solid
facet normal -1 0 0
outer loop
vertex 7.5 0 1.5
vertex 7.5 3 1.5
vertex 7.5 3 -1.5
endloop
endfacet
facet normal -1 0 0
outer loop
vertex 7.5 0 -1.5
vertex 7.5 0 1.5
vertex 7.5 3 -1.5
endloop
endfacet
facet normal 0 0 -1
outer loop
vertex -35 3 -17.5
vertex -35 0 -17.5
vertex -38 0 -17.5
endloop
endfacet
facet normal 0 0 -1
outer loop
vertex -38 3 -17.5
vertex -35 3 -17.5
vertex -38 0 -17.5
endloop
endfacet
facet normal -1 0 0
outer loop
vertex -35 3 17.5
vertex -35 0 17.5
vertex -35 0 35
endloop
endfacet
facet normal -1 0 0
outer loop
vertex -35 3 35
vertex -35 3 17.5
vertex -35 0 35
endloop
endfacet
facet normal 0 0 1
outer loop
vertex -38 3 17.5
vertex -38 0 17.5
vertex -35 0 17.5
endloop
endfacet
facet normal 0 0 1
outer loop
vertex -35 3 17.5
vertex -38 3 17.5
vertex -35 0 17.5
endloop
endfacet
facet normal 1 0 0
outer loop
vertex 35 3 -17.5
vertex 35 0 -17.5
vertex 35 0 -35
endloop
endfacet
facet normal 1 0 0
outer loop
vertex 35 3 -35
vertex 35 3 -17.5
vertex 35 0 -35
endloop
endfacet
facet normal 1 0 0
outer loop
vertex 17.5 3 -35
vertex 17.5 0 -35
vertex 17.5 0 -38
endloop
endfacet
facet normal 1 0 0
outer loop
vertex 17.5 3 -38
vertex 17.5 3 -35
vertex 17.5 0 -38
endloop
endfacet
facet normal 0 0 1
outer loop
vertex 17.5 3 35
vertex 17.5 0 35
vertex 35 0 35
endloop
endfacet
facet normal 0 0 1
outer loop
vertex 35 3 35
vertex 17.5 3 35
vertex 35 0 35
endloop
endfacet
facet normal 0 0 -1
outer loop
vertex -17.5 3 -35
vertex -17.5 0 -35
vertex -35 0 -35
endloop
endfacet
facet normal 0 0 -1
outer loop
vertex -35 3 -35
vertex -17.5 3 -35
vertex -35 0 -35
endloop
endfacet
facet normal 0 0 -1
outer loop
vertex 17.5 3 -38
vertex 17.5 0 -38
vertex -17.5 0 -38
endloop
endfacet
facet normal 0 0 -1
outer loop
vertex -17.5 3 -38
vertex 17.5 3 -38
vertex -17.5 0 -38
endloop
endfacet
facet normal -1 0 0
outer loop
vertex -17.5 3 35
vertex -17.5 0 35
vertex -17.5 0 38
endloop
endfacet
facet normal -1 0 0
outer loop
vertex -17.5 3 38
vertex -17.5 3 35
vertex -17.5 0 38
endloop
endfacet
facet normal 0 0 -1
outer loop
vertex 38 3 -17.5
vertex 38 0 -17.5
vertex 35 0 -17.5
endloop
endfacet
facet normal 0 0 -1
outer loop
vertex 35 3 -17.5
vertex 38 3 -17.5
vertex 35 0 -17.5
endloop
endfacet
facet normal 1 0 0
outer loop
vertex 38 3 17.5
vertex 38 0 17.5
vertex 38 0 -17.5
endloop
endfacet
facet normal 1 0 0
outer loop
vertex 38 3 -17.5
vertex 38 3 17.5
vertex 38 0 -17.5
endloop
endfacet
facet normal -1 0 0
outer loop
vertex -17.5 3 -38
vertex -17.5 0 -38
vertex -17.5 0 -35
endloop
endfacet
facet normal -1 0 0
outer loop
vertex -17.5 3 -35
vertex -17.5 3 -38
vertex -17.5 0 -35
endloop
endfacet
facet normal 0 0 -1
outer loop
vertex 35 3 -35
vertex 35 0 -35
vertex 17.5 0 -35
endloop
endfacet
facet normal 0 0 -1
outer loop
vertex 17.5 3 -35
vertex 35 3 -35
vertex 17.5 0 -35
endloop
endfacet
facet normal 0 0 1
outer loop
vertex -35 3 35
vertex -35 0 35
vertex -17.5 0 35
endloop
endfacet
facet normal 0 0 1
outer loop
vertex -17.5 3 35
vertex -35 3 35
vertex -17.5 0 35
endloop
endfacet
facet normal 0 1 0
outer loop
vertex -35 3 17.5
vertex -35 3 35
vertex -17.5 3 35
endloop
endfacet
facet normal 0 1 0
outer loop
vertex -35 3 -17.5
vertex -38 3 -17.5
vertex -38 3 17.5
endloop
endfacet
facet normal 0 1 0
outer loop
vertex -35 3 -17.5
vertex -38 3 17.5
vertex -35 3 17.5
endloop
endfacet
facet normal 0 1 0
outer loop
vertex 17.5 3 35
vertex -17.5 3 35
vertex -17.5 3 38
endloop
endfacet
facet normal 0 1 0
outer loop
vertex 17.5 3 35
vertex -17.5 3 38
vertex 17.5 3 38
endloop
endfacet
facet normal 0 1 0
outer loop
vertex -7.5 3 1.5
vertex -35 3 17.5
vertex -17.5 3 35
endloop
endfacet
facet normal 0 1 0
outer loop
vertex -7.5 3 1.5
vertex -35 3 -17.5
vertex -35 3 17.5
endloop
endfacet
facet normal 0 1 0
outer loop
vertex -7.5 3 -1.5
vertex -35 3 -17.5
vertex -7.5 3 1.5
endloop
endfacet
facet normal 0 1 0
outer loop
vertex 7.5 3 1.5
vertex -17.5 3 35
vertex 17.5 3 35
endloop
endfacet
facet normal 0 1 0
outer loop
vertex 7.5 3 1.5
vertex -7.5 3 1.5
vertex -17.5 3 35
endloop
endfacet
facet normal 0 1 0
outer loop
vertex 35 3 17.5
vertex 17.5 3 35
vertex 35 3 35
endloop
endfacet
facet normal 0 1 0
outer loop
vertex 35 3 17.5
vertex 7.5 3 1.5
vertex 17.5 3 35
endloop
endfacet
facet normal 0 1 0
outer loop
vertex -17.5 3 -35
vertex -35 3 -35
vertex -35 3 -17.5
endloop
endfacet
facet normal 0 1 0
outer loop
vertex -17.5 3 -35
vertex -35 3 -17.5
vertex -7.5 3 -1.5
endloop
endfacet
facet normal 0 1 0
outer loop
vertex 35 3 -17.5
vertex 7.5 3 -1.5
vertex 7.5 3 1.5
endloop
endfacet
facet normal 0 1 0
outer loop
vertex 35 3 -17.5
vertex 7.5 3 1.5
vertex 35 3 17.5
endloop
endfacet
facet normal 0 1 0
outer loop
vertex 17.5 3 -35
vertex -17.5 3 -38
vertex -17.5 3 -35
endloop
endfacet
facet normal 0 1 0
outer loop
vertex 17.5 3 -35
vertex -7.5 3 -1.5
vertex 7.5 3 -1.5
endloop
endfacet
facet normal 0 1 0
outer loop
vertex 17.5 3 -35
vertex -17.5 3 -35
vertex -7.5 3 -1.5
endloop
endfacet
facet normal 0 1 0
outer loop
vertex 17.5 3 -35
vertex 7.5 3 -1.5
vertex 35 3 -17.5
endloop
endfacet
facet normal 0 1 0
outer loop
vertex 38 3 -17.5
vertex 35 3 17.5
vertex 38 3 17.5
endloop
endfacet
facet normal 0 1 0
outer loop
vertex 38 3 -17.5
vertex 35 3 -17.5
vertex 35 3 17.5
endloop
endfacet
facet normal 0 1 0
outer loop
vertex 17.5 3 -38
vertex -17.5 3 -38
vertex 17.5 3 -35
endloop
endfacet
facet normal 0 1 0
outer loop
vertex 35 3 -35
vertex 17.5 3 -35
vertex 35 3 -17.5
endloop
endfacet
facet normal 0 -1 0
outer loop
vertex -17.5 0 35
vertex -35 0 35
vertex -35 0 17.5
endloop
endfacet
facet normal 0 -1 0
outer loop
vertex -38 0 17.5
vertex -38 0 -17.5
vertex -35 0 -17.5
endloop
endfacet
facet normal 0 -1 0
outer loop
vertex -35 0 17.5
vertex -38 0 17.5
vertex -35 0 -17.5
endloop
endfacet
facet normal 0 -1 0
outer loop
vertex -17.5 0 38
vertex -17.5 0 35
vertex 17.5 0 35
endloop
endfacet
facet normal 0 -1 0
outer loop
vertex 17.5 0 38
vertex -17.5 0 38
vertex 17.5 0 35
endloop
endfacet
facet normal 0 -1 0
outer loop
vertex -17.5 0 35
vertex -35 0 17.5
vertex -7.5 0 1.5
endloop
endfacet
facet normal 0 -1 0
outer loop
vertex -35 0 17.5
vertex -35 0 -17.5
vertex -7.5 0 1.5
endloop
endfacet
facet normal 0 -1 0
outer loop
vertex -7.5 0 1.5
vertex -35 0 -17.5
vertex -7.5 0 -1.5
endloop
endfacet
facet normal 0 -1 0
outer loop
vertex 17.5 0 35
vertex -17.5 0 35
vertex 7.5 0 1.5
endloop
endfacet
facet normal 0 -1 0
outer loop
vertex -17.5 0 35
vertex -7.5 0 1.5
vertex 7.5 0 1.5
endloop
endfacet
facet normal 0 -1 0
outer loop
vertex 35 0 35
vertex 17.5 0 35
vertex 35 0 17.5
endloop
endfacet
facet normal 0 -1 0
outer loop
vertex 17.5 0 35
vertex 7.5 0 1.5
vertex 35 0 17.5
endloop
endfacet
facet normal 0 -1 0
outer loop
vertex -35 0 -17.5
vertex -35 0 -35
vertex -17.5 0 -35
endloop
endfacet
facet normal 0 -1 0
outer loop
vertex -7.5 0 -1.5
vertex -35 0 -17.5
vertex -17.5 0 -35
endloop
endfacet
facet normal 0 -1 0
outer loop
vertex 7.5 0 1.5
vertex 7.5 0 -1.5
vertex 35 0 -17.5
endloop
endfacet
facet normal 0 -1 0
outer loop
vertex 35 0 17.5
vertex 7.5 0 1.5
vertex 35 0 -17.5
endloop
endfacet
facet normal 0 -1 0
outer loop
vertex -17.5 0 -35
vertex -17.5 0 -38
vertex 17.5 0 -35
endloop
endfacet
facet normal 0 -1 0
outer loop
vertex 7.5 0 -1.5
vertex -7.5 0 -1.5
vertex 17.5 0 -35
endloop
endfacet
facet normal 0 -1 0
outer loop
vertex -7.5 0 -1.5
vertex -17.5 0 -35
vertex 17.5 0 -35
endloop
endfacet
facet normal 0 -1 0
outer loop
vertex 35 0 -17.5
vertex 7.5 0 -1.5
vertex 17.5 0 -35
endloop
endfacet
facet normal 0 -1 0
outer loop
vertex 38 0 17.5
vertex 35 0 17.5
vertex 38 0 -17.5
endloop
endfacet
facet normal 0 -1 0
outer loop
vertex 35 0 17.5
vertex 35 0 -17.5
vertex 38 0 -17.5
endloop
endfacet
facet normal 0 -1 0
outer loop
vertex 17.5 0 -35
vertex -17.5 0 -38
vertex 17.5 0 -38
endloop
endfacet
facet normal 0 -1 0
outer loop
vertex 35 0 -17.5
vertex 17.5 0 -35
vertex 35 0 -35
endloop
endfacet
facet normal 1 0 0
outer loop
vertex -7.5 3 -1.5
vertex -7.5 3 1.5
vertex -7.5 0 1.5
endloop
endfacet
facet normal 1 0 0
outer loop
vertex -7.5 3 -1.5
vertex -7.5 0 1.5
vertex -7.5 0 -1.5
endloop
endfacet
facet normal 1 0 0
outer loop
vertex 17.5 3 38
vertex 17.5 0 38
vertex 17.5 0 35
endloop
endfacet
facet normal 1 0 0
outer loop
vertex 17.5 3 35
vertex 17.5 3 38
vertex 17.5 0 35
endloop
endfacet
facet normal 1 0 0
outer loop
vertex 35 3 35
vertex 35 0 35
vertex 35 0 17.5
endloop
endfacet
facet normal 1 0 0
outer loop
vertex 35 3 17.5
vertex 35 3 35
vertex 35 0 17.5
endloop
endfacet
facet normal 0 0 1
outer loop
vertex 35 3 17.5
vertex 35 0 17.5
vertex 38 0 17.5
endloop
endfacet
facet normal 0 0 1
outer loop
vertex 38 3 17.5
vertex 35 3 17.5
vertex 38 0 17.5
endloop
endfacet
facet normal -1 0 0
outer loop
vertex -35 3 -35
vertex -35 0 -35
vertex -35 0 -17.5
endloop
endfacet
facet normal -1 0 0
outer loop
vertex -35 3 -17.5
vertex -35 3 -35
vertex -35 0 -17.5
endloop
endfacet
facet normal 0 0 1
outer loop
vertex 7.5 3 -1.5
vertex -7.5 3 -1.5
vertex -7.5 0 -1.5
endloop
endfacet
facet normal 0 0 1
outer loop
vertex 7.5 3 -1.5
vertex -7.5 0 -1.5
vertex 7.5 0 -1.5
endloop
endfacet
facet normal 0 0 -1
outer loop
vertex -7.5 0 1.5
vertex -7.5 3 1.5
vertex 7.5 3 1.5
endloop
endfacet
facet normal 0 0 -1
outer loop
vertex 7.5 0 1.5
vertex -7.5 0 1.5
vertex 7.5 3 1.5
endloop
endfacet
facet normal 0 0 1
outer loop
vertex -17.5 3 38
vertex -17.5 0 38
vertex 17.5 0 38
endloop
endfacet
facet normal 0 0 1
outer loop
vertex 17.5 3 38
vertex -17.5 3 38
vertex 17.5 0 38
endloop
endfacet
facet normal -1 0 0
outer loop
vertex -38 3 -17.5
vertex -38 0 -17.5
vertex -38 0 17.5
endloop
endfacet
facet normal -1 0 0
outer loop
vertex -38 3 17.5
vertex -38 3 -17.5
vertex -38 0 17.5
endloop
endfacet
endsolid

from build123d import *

# Parameters (mm, degrees)
BOSS_EXTRUDE1_DEPTH = 3
SKETCH2_W           = 15
SKETCH2_H           = 3
CUT_EXTRUDE1_DEPTH  = 3


with BuildPart() as part:
    # Sketch1 → Boss-Extrude1 (new body)
    with BuildSketch(Plane(origin=(0, 0, 0), x_dir=(1, 0, 0), z_dir=(0, 1, 0))):
        Polygon((-35, -35), (-17.5, -35), (-17.5, -38), (17.5, -38), (17.5, -35), (35, -35), (35, -17.5), (38, -17.5), (38, 17.5), (35, 17.5), (35, 35), (17.5, 35), (17.5, 38), (-17.5, 38), (-17.5, 35), (-35, 35), (-35, 17.5), (-38, 17.5), (-38, -17.5), (-35, -17.5), align=None)
    extrude(amount=BOSS_EXTRUDE1_DEPTH)

    # Sketch2 → Cut-Extrude1 (cut)
    with BuildSketch(Plane(origin=(0, 3, 0), x_dir=(1, 0, 0), z_dir=(0, 1, 0))):
        Rectangle(SKETCH2_W, SKETCH2_H)
    extrude(amount=-CUT_EXTRUDE1_DEPTH, mode=Mode.SUBTRACT)


solid = part.part
